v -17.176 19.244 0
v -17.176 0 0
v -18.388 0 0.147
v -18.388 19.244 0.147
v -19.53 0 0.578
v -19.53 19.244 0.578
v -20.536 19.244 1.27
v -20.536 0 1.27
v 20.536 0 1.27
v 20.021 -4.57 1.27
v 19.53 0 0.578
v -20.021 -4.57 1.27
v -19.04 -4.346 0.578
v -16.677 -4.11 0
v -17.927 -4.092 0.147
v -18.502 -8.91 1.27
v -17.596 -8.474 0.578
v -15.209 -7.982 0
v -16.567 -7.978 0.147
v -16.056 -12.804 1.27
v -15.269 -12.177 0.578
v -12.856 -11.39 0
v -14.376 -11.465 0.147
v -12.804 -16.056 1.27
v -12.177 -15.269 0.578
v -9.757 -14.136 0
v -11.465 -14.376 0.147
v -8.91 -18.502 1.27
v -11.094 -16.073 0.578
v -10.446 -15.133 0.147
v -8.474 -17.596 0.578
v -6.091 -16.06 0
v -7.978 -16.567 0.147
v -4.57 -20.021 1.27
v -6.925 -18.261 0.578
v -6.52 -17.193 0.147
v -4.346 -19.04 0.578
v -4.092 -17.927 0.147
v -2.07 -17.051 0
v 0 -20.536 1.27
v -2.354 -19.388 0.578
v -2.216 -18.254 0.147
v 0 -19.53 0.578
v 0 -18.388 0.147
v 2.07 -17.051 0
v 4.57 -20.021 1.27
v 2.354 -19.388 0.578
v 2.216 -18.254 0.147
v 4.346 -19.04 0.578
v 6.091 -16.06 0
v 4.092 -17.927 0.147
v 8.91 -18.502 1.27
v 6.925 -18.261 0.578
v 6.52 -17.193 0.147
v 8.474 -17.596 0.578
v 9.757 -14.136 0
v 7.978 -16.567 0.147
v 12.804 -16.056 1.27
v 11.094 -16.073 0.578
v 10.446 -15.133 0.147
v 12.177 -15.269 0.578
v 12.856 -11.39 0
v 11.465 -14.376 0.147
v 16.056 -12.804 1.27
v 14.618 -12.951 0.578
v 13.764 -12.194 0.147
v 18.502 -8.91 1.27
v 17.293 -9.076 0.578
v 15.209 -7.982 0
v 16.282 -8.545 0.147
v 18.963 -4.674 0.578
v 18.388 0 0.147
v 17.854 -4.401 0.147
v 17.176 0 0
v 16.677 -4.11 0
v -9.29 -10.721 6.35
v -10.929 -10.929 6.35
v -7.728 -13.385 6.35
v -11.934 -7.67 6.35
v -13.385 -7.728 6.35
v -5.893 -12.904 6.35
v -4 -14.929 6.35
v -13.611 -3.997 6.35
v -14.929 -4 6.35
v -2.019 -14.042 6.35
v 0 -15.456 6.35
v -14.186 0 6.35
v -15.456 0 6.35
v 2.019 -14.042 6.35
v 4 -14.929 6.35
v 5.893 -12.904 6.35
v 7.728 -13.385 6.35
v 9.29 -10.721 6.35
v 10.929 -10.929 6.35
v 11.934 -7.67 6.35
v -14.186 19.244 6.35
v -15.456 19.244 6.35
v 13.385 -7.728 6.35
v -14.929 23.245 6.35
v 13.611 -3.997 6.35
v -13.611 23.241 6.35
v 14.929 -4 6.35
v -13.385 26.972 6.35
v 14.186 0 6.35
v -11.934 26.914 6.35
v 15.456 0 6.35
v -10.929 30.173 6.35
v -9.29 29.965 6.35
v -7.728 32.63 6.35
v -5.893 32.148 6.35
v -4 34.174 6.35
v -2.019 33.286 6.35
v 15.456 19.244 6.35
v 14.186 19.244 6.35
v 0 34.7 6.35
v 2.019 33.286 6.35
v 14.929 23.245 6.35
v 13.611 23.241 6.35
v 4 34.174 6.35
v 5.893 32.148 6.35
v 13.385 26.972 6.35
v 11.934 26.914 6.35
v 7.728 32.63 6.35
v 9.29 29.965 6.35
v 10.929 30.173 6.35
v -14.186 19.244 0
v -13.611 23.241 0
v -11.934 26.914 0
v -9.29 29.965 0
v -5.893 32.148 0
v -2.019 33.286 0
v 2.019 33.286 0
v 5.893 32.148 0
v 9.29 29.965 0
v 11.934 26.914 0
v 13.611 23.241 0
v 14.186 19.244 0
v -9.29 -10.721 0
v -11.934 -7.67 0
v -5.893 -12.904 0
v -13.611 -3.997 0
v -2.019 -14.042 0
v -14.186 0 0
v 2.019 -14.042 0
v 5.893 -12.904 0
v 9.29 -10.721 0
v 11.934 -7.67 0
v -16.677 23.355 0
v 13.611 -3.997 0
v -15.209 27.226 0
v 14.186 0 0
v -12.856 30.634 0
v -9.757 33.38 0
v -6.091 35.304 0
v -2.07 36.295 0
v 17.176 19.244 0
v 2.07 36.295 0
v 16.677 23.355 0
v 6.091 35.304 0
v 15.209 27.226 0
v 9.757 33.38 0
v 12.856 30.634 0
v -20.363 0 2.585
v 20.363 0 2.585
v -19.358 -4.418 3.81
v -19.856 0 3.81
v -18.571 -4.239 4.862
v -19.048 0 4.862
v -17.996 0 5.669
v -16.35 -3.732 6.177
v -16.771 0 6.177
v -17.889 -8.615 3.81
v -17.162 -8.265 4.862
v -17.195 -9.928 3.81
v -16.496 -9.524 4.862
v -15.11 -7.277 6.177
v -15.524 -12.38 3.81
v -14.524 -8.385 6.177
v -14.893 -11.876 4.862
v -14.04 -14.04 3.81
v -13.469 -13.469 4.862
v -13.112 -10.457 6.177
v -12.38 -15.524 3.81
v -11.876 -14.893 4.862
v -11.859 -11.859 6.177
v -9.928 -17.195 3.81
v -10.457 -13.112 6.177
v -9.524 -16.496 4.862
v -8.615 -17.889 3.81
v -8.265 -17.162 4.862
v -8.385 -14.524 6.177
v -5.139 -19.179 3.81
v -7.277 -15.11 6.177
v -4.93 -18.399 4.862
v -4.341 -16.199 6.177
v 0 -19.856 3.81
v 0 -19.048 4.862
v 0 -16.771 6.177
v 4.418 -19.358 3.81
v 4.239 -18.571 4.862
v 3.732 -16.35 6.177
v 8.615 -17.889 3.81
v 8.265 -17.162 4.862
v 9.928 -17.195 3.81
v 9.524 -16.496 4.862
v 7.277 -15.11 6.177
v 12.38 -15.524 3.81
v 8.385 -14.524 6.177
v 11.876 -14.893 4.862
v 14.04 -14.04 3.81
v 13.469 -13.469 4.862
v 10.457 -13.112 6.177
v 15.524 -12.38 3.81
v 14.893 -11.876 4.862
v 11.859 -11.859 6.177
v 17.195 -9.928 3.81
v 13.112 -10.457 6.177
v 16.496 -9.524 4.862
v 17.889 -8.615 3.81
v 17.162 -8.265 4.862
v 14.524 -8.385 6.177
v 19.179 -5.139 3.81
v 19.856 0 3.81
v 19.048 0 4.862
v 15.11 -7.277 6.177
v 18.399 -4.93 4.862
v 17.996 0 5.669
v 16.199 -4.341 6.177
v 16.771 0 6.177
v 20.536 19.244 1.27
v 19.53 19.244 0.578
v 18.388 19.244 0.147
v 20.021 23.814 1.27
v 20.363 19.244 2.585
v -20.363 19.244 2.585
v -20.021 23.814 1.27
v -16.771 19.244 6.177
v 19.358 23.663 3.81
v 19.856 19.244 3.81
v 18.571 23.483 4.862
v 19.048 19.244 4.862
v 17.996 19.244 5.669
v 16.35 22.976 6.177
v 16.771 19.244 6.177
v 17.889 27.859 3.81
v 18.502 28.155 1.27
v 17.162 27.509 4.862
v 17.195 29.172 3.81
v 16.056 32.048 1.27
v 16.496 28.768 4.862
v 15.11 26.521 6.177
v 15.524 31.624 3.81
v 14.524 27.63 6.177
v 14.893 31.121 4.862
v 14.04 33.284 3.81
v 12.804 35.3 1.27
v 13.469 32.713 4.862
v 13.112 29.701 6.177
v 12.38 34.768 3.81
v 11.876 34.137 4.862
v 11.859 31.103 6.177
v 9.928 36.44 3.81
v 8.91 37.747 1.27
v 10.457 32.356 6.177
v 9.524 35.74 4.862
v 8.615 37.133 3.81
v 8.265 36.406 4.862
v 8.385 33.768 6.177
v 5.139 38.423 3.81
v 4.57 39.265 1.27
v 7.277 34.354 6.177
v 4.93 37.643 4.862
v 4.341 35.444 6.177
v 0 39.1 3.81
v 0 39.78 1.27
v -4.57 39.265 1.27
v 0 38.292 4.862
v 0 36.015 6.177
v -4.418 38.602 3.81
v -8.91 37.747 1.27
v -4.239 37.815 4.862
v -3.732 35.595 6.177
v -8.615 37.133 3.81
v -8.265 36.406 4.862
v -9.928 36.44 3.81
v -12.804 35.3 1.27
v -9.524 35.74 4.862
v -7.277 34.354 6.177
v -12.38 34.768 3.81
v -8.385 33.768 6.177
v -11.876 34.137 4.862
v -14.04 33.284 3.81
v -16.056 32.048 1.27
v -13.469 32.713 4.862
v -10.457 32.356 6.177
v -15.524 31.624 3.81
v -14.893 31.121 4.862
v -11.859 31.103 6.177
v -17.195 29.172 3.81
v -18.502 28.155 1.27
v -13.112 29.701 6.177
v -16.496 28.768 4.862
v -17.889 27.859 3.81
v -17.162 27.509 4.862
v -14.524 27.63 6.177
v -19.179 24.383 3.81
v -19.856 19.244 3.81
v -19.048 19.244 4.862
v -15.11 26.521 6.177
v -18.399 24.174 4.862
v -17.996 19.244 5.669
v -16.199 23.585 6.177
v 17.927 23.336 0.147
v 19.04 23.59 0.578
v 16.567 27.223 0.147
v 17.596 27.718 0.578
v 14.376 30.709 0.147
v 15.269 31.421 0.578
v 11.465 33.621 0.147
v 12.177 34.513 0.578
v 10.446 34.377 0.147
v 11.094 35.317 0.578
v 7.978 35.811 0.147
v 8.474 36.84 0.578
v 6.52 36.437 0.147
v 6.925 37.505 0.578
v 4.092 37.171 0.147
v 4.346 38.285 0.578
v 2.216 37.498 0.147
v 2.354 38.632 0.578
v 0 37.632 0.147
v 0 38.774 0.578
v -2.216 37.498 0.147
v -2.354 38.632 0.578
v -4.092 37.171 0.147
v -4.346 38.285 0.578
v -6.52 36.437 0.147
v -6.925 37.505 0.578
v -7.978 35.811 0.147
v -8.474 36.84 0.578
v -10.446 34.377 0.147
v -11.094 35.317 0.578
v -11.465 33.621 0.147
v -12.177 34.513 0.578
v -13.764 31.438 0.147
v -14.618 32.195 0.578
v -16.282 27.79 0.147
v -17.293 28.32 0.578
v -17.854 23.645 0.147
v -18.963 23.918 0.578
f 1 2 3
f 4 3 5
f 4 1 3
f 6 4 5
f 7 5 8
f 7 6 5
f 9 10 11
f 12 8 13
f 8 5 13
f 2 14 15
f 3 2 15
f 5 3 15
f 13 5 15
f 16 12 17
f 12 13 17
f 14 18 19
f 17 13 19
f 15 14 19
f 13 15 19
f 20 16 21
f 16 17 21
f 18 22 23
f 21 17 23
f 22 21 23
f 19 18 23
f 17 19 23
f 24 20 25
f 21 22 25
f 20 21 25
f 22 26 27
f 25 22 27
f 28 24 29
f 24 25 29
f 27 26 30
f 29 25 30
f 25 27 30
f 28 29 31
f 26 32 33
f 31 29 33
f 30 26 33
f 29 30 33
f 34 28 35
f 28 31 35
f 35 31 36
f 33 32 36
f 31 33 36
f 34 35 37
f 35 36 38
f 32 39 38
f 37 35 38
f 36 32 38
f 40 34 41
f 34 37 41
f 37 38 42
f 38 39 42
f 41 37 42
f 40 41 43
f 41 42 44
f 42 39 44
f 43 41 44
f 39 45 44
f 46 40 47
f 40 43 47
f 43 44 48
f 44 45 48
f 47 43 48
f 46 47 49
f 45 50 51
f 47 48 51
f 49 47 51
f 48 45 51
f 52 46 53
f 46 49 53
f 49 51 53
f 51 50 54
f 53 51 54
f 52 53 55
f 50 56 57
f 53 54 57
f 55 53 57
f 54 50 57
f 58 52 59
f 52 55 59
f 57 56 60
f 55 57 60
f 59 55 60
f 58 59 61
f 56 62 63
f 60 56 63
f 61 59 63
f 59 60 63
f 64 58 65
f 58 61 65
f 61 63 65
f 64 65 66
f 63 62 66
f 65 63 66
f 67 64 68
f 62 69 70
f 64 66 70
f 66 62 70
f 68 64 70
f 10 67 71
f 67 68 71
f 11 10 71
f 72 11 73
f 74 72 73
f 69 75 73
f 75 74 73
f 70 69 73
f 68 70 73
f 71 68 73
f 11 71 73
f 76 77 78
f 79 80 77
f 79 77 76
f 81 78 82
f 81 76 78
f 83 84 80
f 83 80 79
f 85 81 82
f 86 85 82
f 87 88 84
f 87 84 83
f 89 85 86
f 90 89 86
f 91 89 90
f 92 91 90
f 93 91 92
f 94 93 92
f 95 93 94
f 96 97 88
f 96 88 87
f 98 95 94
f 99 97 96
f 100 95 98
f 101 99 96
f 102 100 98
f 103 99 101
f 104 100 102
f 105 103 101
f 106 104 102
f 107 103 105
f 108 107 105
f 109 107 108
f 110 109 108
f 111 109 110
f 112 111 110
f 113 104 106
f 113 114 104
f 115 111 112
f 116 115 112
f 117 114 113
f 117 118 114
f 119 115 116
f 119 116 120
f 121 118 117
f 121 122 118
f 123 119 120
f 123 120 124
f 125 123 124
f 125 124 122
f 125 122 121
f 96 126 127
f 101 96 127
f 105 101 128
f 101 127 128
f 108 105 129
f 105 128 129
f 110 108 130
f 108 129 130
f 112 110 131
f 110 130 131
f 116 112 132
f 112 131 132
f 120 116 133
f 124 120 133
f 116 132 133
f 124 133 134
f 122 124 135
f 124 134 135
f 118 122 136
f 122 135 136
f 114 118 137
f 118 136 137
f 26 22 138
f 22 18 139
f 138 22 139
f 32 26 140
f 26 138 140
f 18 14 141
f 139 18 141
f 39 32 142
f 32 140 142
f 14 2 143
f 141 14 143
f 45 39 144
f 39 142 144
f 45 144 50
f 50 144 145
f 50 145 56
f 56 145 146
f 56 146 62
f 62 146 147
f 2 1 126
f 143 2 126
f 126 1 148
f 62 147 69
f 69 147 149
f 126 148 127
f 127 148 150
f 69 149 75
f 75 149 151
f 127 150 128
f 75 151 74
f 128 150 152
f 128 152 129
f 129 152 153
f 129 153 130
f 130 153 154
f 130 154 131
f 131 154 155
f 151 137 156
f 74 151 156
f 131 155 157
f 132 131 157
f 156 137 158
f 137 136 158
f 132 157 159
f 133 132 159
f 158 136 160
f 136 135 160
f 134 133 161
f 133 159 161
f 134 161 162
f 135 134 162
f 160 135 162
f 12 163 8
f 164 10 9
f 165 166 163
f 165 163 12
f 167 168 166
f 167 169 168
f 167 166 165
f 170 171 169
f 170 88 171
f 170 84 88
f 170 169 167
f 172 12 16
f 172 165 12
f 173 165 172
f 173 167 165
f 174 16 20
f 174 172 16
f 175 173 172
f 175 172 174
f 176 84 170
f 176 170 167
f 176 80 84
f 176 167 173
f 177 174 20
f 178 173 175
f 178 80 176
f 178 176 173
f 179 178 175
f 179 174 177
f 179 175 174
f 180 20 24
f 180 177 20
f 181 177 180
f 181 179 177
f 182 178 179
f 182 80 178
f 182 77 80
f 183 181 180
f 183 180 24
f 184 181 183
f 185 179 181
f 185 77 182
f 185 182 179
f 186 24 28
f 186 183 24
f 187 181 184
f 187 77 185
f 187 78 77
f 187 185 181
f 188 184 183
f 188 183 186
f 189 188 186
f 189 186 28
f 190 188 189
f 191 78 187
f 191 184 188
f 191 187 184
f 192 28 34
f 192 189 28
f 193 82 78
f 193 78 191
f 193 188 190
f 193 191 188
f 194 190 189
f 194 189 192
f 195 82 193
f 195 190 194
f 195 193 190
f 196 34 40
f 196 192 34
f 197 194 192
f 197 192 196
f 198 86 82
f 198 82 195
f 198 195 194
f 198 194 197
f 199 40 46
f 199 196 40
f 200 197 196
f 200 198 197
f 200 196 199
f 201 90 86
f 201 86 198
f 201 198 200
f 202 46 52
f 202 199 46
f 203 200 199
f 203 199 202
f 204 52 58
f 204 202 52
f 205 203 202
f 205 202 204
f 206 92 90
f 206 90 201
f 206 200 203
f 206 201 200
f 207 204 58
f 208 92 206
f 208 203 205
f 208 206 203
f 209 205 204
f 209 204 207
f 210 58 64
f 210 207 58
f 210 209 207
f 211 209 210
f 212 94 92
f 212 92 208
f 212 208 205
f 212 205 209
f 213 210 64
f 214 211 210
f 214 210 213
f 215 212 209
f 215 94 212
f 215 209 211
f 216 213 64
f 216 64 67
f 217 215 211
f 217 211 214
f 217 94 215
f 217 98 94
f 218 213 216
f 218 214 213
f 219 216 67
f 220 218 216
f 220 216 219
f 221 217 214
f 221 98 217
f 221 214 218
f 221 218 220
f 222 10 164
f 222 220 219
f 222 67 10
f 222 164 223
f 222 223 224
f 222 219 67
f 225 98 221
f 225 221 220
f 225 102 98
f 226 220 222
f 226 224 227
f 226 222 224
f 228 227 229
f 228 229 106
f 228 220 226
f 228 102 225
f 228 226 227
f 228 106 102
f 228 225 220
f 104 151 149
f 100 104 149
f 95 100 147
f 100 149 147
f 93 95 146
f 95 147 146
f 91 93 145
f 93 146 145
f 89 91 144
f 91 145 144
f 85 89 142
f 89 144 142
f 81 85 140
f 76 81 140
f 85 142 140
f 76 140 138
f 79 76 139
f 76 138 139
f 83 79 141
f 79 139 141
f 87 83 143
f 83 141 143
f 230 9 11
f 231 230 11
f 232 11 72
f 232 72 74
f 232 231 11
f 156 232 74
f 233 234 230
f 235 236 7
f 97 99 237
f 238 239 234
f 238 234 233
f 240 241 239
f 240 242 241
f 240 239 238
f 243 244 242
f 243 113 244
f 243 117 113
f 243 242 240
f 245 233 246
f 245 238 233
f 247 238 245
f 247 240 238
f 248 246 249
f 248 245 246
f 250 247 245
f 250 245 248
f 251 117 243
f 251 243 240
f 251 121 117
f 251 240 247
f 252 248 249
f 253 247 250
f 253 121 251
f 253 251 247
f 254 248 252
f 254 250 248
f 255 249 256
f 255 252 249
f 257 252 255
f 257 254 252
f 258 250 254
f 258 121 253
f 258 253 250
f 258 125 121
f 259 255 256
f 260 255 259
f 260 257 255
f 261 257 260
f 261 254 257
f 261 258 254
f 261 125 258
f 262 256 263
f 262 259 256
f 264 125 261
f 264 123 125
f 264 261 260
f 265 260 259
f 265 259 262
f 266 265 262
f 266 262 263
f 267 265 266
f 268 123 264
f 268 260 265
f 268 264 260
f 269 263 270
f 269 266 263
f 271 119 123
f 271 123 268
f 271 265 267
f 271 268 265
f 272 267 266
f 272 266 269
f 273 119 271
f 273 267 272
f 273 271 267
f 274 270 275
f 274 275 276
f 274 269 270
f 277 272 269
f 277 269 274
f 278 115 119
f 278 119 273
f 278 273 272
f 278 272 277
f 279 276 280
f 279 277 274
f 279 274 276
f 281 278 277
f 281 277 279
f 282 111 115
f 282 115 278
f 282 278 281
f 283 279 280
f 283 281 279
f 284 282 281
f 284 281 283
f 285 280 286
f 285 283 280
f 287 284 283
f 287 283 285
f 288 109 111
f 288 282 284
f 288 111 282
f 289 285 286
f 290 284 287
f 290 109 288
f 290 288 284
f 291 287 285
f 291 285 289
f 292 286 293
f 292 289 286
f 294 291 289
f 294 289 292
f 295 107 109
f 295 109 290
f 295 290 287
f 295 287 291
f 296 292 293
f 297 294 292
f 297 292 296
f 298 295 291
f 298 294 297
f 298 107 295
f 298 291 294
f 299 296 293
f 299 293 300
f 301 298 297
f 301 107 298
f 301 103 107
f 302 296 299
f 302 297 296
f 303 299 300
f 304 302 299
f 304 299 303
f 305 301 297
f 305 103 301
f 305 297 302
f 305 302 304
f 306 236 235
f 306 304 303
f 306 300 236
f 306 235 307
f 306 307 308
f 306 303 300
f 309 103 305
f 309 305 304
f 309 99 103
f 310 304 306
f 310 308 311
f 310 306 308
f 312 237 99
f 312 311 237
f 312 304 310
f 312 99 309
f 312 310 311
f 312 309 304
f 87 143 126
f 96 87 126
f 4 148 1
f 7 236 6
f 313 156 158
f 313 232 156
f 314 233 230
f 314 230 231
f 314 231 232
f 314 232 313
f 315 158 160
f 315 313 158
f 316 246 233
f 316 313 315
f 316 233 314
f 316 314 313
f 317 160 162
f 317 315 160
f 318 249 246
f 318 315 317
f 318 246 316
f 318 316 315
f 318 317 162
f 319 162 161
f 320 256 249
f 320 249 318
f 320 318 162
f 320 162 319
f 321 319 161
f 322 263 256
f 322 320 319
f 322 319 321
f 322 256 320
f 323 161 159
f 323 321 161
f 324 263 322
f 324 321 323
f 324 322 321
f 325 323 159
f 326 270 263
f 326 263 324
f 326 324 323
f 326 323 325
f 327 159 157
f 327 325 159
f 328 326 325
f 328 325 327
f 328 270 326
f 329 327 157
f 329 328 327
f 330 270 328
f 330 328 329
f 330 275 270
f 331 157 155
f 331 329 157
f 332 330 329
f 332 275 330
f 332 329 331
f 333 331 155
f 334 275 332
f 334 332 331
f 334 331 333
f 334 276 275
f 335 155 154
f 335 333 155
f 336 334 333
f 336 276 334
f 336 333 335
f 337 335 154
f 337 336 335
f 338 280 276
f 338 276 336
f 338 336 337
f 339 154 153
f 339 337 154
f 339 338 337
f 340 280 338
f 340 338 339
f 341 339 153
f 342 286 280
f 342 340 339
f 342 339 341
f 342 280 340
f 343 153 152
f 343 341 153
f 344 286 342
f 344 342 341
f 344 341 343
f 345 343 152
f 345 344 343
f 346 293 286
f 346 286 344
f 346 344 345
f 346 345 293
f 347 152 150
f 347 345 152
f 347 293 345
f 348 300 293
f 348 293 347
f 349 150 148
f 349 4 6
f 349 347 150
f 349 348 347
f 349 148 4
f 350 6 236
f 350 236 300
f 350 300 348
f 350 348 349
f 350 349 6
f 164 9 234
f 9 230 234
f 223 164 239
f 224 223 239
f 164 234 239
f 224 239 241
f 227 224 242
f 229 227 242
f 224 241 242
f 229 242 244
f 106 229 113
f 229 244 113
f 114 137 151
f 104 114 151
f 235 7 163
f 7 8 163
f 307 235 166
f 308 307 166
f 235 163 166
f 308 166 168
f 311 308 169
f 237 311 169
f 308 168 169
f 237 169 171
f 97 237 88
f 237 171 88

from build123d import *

# Parameters (mm, degrees)
F1_DEPTH    = 6.35
F2_R        = 5.08
F3_T1_DEPTH = 19.2442405969
F3_T4_ANGLE = 180
F3_T6_ANGLE = 180


# Not quite as in the source:
# - a fillet or chamfer that OpenCascade refuses, or shapes differently, is made with other operations: its cross-section is extruded or revolved along the edge and cut away or added


with BuildPart() as f1:
    # F0 (on Top) → F1 (new body)
    with BuildSketch(Plane.XY):
        with BuildLine():
            Line((20.5361241051, 0), (20.5361241051, 19.2442405969))
            ThreePointArc((20.5361241051, 19.2442405969), (0, 39.780364702), (-20.5361241051, 19.2442405969))
            Line((-20.5361241051, 19.2442405969), (-20.5361241051, 0))
            ThreePointArc((-20.5361241051, 0), (0, -20.5361241051), (20.5361241051, 0))
        make_face()
        with BuildLine():
            ThreePointArc((14.1861241051, 0), (0, -14.1861241051), (-14.1861241051, 0))
            Line((-14.1861241051, 0), (-14.1861241051, 19.2442405969))
            ThreePointArc((-14.1861241051, 19.2442405969), (0, 33.430364702), (14.1861241051, 19.2442405969))
            Line((14.1861241051, 19.2442405969), (14.1861241051, 0))
        make_face(mode=Mode.SUBTRACT)
    extrude(amount=F1_DEPTH)

    # F2
    f2_edges = [f1.edges().sort_by_distance(p)[0] for p in [
        (0, 39.780365, 6.35),
    ]]
    fillet(f2_edges, radius=F2_R)

    # F3: fillet of radius 5.08 on 1 edges, made by hand

    # F3_s2 → F3_t1 (cut)
    with BuildSketch(Plane.XZ.offset(-19.2442405969)):
        with BuildLine():
            ThreePointArc((20.5361241051, 1.27), (18.9720711643, 0.3280951188), (17.1760199401, 0))
            Line((17.1760199401, 0), (20.5361241051, 0))
            Line((20.5361241051, 0), (20.5361241051, 1.27))
        make_face()
        with BuildLine():
            ThreePointArc((-17.1760199401, 0), (-18.9720711643, 0.3280951188), (-20.5361241051, 1.27))
            Line((-20.5361241051, 1.27), (-20.5361241051, 0))
            Line((-20.5361241051, 0), (-17.1760199401, 0))
        make_face()
    extrude(amount=F3_T1_DEPTH, mode=Mode.SUBTRACT)

    # F3_s3 → F3_t4 (revolve, cut)
    with BuildSketch(Plane.XZ.offset(-19.2442405969)):
        with BuildLine():
            ThreePointArc((17.1760199401, 0), (18.9720711643, 0.3280951188), (20.5361241051, 1.27))
            Line((20.5361241051, 1.27), (20.5361241051, 0))
            Line((20.5361241051, 0), (17.1760199401, 0))
        make_face()
    revolve(axis=Axis((0, 19.2442405969, 0), (0, 0, 1)), revolution_arc=F3_T4_ANGLE, mode=Mode.SUBTRACT)

    # F3_s5 → F3_t6 (revolve, cut)
    with BuildSketch(Plane.XZ):
        with BuildLine():
            ThreePointArc((-20.5361241051, 1.27), (-18.9720711643, 0.3280951188), (-17.1760199401, 0))
            Line((-17.1760199401, 0), (-20.5361241051, 0))
            Line((-20.5361241051, 0), (-20.5361241051, 1.27))
        make_face()
    revolve(axis=Axis((0, 0, 0), (0, 0, 1)), revolution_arc=F3_T6_ANGLE, mode=Mode.SUBTRACT)


solid = f1.part
